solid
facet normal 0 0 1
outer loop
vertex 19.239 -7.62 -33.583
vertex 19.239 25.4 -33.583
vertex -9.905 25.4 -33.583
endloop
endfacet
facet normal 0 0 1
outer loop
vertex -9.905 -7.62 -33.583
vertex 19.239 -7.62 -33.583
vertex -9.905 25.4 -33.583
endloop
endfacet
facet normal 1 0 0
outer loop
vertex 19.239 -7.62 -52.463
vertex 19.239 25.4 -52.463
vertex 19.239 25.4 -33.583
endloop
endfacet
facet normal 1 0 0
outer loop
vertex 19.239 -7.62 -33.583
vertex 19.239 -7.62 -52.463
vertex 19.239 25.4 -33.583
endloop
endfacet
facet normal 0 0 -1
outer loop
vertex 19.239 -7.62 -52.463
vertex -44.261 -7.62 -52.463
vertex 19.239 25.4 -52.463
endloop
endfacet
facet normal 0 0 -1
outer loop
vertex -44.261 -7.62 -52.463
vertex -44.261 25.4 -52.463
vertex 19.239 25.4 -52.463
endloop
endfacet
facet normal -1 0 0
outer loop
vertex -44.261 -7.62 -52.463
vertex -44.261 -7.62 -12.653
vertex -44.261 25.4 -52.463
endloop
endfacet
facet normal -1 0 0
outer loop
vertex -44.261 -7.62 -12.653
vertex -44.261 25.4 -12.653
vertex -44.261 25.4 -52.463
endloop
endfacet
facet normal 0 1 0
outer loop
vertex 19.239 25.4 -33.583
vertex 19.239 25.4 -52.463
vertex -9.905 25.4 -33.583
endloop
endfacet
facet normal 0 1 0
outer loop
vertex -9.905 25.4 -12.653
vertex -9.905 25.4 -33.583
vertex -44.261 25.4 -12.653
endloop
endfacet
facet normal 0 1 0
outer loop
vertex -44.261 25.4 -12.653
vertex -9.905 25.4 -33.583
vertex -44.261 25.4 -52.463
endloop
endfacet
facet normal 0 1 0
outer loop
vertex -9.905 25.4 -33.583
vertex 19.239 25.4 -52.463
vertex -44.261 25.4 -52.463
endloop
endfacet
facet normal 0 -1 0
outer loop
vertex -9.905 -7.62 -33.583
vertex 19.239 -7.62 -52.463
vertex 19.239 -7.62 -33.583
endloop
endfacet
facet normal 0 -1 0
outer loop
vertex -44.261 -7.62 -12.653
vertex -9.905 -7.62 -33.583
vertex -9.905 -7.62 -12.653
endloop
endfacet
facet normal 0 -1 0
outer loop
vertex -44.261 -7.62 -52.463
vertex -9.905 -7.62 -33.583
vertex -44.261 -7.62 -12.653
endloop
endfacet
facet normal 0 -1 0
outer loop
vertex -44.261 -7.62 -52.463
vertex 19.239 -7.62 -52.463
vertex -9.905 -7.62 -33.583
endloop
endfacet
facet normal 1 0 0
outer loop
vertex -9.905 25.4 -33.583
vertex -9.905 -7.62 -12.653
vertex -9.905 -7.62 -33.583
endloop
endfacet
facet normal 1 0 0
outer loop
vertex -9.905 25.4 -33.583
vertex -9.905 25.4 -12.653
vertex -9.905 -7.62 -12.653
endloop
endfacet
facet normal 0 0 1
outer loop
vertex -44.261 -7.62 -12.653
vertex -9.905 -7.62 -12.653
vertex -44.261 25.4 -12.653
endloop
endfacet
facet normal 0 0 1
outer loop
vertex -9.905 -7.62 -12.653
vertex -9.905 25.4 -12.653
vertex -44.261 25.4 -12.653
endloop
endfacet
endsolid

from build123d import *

# Parameters (mm, degrees)
F1_DEPTH = 25.4
F2_DEPTH = 7.62
F3_DEPTH = 7.62


with BuildPart() as f1:
    # F0 (on Front) → F1 (new body)
    with BuildSketch(Plane.XZ):
        Polygon((-9.9045233801, -20.2733278275), (-44.2608483136, -20.2733278275), (-44.2608483136, -52.4630360305), (19.2391516864, -52.4630360305), (19.2391516864, -33.582534641), (-9.9045233801, -33.582534641), align=None)
    extrude(amount=-F1_DEPTH)

    # F2 (add): a face of the model
    f2_faces = [f1.faces().sort_by_distance(p)[0] for p in [
        (-27.0826858468, 12.7, -20.2733278275),
    ]]
    extrude(f2_faces, amount=F2_DEPTH)

    # F3 (add): a face of the model
    f3_faces = [f1.faces().sort_by_distance(p)[0] for p in [
        (-17.9738795934, 0, -35.5603880692),
    ]]
    extrude(f3_faces, amount=F3_DEPTH)


solid = f1.part
